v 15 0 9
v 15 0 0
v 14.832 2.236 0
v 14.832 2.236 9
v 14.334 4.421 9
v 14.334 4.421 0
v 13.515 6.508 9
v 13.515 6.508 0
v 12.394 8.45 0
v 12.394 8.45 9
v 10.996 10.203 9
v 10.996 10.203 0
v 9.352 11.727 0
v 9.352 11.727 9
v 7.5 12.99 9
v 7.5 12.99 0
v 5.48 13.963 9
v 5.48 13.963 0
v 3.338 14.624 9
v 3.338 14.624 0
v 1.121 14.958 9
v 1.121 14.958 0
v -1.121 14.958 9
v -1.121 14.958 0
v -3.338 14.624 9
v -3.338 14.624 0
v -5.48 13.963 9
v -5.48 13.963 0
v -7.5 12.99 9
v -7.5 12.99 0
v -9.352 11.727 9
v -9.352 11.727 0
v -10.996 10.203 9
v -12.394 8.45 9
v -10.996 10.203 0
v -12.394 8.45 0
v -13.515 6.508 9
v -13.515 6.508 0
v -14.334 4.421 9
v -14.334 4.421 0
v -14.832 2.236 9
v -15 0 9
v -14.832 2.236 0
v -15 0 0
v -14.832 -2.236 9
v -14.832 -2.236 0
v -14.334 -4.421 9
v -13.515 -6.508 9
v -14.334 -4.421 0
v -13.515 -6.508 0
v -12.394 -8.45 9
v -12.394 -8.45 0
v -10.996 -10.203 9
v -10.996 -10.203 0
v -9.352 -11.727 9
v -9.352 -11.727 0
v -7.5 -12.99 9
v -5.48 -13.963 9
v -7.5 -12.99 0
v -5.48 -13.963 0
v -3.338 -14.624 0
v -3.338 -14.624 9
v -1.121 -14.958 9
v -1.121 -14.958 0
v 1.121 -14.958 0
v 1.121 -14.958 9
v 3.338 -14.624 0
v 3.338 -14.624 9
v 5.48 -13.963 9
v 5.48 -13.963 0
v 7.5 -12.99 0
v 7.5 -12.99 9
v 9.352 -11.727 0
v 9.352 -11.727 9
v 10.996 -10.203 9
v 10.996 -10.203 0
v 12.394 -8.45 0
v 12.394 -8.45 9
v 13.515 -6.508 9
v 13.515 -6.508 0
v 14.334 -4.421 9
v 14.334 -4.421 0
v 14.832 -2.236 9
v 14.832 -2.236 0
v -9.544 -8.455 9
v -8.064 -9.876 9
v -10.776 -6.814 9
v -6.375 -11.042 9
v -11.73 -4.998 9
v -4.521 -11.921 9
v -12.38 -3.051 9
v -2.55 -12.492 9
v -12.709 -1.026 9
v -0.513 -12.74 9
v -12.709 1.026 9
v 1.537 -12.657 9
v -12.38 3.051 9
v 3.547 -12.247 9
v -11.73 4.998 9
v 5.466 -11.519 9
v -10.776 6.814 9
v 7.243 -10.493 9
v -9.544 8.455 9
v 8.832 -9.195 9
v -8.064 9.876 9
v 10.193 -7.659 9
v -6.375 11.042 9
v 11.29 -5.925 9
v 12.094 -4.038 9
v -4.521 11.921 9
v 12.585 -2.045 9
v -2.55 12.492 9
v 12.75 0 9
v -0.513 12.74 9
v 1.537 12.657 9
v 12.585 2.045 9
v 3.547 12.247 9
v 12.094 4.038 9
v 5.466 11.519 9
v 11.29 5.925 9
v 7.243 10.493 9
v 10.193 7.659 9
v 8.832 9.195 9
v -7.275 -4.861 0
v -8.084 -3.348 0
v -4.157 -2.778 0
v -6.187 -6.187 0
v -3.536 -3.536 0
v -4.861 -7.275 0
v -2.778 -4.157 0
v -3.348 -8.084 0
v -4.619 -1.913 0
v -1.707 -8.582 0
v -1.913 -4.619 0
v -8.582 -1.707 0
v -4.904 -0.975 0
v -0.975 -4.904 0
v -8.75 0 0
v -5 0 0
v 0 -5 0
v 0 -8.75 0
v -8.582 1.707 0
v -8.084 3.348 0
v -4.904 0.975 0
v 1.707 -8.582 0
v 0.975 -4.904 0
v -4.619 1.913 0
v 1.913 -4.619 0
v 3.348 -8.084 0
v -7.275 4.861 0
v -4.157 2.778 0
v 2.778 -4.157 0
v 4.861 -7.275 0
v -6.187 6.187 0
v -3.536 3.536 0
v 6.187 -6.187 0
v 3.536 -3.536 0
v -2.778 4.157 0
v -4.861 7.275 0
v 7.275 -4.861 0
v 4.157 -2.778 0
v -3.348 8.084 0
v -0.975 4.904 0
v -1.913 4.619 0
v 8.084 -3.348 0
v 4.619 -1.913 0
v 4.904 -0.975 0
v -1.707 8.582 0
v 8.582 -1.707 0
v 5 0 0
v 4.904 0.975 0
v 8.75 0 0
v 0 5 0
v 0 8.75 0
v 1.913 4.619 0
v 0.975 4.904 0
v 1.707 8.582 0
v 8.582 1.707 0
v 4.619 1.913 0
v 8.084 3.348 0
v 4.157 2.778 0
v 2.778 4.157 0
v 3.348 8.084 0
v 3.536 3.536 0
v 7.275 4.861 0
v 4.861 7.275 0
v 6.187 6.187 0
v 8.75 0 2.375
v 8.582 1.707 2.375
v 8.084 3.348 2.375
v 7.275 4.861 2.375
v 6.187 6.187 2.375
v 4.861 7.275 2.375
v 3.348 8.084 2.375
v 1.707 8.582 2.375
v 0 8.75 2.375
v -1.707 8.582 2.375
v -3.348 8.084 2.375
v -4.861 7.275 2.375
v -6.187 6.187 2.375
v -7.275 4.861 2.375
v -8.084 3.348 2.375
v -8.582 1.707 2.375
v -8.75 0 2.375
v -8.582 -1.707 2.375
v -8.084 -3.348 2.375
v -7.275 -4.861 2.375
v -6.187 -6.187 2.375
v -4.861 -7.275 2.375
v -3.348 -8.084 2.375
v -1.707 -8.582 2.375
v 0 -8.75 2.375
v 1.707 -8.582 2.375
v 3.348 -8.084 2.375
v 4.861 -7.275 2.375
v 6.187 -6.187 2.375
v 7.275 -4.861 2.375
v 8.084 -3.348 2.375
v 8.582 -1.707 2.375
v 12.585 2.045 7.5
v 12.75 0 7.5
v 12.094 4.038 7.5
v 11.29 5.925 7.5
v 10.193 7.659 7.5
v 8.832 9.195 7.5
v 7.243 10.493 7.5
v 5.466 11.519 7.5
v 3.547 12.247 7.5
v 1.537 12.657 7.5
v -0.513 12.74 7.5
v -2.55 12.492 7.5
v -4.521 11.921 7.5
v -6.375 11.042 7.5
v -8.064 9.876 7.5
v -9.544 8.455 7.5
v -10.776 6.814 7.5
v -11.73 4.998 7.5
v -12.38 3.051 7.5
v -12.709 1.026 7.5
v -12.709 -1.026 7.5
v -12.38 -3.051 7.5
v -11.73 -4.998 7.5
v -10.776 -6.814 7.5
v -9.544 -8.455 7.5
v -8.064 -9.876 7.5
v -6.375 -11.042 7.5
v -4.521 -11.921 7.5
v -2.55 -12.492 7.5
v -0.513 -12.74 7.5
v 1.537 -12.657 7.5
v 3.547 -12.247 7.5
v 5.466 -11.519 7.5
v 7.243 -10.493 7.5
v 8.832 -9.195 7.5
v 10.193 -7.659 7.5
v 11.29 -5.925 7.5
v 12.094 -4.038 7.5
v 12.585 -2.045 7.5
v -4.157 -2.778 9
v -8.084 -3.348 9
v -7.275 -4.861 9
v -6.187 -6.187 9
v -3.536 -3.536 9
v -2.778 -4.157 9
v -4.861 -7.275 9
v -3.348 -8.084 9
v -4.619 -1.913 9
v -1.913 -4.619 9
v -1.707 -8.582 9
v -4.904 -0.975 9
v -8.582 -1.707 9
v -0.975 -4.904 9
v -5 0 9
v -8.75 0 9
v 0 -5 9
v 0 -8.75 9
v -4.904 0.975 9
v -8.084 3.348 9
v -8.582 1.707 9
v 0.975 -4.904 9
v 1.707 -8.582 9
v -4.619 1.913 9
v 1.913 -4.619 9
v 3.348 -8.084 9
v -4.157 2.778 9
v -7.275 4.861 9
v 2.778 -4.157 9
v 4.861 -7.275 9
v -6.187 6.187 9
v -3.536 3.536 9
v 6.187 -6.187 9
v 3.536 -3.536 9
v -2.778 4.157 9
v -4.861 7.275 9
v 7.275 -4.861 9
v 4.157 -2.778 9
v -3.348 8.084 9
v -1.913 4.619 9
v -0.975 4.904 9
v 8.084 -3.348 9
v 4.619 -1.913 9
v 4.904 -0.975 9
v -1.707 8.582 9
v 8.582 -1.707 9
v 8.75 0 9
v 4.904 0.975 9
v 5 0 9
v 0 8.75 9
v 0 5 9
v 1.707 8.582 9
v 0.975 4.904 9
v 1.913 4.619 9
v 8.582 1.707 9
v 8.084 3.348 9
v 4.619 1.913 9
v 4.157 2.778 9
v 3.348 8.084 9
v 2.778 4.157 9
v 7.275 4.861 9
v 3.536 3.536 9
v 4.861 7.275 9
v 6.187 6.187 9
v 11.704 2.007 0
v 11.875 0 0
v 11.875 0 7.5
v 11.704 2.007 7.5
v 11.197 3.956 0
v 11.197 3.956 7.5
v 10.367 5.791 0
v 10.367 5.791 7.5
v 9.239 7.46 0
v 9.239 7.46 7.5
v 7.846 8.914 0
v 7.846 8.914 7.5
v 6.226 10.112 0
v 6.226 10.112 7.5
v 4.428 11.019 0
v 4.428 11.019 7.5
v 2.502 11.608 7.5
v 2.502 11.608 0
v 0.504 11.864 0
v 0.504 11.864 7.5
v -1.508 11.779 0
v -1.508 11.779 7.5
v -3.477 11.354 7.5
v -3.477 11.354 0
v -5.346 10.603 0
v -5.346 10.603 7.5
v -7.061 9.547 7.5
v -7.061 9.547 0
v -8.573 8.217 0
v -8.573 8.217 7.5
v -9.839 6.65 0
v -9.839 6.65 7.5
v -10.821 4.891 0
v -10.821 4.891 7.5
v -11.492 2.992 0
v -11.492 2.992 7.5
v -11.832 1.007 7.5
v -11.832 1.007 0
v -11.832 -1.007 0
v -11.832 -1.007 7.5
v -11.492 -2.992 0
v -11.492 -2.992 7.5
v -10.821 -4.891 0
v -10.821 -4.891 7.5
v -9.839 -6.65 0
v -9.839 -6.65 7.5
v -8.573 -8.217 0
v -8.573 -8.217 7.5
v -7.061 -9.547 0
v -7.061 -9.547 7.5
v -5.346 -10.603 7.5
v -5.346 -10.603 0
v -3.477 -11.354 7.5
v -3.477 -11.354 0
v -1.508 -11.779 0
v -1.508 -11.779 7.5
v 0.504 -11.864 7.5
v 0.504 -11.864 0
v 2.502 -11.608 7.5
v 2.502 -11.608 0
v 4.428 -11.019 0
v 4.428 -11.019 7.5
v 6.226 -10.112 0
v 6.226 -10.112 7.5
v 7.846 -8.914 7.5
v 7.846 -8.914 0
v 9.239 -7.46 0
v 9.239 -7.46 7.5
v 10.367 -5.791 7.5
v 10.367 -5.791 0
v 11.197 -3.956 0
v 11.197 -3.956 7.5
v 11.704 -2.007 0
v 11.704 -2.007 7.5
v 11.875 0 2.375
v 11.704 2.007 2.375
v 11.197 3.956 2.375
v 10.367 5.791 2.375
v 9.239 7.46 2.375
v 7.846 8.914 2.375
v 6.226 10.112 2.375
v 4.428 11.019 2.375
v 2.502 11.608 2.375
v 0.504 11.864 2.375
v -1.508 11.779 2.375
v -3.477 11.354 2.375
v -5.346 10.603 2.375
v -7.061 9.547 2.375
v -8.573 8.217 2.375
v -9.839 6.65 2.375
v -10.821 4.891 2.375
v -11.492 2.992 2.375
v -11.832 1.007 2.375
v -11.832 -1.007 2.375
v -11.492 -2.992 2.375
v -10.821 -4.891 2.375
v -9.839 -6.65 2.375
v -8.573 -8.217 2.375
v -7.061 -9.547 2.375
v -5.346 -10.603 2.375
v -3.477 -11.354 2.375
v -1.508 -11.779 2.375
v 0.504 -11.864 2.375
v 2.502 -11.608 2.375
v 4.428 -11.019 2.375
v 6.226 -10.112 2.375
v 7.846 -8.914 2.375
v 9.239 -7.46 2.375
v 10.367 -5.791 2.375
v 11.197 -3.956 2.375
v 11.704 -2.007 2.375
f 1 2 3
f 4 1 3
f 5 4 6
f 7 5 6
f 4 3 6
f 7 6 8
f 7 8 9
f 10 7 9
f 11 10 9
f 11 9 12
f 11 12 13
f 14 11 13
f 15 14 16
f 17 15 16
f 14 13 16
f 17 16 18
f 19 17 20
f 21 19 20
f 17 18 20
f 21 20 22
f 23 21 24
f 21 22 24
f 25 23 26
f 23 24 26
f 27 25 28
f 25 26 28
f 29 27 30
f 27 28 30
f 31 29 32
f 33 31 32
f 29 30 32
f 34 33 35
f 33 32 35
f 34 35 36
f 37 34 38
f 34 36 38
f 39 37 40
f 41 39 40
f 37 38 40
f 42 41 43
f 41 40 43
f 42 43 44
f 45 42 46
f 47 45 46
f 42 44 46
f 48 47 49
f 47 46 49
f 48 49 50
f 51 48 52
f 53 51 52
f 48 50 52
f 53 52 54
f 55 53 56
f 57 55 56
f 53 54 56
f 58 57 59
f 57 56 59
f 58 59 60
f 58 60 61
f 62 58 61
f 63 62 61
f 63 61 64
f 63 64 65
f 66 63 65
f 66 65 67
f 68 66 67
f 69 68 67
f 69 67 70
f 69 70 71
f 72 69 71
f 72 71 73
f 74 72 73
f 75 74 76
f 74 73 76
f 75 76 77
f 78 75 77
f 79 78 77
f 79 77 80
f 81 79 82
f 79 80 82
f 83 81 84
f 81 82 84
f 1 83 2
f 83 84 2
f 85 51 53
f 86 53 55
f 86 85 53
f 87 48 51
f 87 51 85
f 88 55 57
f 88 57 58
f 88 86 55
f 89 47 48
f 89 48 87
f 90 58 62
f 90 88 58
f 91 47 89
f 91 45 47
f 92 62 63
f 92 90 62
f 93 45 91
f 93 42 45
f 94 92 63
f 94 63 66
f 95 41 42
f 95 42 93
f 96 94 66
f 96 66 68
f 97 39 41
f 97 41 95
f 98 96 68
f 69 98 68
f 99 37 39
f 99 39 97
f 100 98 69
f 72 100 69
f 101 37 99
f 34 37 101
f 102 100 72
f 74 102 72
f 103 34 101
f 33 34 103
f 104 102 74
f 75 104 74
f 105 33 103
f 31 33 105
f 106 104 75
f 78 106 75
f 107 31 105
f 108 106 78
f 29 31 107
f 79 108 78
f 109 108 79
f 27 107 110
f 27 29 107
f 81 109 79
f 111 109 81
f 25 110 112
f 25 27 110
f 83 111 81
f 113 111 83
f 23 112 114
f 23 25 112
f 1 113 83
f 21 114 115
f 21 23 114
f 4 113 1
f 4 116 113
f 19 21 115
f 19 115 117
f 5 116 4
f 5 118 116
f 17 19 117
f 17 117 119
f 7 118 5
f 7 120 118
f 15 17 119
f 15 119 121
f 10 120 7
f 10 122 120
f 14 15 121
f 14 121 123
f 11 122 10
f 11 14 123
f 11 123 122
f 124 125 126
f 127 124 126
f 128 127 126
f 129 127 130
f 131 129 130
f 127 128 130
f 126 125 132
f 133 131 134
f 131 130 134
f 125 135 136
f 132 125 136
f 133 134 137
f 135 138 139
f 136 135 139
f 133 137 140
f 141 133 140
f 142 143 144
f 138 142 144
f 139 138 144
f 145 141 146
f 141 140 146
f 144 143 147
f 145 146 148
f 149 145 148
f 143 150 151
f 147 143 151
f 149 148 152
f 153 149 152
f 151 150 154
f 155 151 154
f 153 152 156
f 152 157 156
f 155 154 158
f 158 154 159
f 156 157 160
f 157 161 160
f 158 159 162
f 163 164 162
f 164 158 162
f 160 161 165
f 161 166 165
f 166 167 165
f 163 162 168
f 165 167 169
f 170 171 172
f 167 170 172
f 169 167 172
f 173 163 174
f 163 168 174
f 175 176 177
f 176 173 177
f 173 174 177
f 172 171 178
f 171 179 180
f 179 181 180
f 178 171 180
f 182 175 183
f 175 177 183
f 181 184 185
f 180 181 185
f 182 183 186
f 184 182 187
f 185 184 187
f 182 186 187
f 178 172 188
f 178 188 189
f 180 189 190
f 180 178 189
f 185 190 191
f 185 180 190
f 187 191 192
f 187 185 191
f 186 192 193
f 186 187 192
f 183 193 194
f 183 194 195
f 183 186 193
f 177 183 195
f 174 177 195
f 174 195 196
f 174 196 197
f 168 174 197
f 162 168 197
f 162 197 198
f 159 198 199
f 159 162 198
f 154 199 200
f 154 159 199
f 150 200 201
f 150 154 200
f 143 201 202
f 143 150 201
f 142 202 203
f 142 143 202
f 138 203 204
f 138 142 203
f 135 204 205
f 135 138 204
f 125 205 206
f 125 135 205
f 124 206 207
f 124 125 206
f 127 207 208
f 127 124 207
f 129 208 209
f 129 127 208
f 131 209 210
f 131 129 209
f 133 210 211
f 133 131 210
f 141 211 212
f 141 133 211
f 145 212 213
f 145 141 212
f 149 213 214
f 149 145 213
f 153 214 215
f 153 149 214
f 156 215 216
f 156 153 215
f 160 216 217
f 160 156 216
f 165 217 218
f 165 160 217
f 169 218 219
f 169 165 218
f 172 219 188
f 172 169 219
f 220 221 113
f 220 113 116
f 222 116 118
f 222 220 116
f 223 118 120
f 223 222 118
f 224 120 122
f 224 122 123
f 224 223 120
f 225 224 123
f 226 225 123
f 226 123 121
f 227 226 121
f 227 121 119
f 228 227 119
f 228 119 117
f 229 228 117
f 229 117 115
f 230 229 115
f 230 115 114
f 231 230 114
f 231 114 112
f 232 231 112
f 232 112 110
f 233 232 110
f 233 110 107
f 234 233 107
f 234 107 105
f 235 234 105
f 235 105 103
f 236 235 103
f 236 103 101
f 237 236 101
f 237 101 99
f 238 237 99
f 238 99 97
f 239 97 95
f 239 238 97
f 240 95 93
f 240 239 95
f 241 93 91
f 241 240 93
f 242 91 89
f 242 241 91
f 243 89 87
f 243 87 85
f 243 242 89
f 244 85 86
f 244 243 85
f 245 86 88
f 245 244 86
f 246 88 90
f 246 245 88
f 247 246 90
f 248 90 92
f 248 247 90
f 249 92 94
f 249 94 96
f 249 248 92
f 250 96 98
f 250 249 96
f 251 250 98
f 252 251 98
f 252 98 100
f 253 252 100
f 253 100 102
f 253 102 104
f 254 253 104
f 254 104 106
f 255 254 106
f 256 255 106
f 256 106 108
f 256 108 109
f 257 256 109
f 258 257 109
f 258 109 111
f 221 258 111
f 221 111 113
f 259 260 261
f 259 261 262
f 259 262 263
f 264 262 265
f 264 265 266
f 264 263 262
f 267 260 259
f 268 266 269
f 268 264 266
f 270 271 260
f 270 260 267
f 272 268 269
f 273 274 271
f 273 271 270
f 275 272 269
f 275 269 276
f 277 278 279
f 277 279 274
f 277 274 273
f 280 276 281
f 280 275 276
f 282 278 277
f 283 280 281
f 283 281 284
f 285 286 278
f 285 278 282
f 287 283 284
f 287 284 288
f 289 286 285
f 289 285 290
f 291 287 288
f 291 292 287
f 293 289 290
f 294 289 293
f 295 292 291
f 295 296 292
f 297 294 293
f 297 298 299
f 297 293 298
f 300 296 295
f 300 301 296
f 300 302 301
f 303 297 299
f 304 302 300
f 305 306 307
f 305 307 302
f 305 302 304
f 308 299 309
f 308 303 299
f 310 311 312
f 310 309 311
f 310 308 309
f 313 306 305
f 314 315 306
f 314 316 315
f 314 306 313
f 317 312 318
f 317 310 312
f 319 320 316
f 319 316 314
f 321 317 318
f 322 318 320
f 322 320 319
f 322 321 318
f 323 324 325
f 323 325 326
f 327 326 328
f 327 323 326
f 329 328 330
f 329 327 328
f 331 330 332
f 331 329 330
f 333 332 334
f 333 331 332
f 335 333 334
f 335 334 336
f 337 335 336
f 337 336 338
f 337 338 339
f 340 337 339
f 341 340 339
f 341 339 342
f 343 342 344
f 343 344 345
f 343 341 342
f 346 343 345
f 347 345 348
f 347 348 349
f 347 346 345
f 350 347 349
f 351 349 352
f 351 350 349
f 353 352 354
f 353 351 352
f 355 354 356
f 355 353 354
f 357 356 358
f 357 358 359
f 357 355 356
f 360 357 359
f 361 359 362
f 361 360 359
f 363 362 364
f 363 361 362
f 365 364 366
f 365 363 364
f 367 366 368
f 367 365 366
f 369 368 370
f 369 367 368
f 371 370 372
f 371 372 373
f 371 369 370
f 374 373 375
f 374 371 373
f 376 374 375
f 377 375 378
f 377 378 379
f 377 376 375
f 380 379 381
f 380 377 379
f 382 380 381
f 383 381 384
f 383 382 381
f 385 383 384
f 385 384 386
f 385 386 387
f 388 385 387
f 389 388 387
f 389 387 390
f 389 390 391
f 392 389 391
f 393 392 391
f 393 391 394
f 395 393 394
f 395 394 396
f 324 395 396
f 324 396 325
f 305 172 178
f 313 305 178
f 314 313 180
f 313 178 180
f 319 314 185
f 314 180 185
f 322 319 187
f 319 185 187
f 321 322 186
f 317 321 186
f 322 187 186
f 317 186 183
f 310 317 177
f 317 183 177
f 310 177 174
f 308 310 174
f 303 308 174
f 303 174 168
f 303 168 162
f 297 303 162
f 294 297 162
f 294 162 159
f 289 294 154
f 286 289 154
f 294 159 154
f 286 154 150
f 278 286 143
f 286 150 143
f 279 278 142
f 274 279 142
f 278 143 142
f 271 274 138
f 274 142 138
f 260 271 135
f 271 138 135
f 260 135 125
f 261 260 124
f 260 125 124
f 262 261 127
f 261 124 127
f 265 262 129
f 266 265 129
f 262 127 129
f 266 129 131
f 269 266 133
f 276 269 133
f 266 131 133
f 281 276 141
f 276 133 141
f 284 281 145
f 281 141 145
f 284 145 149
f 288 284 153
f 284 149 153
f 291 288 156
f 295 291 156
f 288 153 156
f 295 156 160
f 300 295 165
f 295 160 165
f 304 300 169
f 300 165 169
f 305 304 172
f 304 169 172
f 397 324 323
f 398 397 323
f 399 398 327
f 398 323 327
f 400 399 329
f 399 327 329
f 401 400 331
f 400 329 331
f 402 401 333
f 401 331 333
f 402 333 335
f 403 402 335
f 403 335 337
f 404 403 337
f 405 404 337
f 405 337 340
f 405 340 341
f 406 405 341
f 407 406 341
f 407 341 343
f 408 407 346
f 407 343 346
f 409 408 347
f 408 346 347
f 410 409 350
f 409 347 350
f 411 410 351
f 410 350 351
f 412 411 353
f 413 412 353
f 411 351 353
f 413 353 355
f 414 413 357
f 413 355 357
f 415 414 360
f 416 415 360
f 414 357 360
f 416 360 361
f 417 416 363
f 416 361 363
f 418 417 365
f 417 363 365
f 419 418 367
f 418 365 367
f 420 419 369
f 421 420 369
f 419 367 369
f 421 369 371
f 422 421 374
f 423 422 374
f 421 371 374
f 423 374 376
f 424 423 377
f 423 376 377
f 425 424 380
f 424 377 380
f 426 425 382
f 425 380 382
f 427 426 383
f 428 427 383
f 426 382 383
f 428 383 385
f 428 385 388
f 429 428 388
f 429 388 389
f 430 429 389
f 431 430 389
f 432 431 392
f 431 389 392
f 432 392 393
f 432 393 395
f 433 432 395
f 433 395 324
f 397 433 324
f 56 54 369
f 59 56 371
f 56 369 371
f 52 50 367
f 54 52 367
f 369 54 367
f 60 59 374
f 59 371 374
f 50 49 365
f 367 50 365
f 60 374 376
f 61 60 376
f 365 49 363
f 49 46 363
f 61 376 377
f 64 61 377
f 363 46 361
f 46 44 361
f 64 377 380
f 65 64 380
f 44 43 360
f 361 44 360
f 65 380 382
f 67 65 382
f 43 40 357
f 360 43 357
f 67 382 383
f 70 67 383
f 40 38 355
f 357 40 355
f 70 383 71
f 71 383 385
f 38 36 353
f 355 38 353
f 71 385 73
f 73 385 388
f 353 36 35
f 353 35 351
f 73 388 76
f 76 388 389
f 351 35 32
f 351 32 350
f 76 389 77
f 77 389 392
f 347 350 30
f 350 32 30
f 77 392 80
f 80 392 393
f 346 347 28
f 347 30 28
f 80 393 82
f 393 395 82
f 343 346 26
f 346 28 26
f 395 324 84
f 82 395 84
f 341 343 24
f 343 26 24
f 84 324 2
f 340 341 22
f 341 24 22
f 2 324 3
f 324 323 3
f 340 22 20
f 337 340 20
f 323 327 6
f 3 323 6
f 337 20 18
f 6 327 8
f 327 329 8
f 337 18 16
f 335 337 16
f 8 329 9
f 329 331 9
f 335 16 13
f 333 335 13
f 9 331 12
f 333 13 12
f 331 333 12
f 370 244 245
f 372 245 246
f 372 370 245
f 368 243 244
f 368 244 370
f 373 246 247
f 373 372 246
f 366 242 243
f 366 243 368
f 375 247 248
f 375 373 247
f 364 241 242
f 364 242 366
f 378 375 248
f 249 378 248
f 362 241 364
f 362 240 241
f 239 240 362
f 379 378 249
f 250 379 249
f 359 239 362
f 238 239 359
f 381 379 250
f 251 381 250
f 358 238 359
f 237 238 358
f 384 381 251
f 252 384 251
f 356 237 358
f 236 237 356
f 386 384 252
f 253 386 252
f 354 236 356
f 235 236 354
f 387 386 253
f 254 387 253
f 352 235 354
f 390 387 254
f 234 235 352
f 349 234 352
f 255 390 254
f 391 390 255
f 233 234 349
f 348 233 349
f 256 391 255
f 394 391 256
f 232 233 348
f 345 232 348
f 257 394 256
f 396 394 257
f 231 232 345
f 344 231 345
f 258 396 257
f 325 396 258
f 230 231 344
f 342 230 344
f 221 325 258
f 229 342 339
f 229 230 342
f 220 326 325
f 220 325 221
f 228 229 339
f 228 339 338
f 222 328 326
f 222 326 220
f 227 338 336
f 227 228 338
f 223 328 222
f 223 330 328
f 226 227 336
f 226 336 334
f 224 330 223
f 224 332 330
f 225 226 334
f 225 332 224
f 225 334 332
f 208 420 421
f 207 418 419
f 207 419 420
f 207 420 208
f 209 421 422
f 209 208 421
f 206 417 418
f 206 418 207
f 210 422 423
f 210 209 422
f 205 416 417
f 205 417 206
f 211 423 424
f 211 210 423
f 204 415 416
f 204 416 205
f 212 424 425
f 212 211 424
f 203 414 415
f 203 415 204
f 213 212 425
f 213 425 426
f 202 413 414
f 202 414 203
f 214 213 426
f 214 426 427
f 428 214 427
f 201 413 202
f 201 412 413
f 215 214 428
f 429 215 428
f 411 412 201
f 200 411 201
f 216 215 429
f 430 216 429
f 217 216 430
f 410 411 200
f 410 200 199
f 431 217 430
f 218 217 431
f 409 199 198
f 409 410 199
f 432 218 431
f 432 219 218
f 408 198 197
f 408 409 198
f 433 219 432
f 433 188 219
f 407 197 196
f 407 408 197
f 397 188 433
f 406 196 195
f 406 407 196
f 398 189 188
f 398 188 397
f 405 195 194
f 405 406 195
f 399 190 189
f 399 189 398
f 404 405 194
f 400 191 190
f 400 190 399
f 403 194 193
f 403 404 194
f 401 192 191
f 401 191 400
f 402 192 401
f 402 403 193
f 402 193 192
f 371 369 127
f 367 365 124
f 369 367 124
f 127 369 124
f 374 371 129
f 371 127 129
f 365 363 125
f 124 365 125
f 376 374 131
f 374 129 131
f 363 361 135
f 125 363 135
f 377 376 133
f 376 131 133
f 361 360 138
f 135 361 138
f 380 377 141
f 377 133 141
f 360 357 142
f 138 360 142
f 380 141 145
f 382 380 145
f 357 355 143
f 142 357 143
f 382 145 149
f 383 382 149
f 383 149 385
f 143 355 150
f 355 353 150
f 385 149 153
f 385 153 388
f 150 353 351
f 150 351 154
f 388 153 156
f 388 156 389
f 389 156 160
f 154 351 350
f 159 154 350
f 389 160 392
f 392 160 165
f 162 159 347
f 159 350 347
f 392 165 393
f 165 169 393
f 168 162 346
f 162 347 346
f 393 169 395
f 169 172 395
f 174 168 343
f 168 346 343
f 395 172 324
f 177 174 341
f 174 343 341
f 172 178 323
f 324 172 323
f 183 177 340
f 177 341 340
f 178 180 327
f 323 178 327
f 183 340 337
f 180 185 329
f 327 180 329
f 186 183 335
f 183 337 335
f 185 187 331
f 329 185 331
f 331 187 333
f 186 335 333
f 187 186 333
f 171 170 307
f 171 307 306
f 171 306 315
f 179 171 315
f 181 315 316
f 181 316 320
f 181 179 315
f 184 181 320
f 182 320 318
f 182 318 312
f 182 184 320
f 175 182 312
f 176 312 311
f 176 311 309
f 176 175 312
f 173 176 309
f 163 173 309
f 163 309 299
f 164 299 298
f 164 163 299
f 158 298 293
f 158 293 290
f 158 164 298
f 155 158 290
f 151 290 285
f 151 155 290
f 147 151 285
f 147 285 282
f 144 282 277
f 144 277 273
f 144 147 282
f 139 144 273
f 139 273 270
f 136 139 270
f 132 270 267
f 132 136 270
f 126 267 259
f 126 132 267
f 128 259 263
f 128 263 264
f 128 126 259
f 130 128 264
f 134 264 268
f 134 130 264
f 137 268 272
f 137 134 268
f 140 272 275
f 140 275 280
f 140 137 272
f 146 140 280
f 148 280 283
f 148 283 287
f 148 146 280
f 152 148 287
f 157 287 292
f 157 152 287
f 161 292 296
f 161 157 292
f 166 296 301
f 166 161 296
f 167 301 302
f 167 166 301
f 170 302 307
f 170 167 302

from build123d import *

# Parameters (mm, degrees)
F0_R     = 15
F0_R_2   = 12.75
F0_R_3   = 8.75
F0_R_4   = 5
F1_DEPTH = 9
F0_R_5   = 11.875
F2_DEPTH = 7.5
F3_DEPTH = 2.375


with BuildPart() as f1:
    # F0 (on Top) → F1 (new body)
    with BuildSketch(Plane.XY):
        Circle(F0_R)
        Circle(F0_R_2, mode=Mode.SUBTRACT)
        Circle(F0_R_3)
        Circle(F0_R_4, mode=Mode.SUBTRACT)
    extrude(amount=F1_DEPTH)

    # F0 (on Top) → F2 (join)
    with BuildSketch(Plane.XY):
        Circle(F0_R_2)
        Circle(F0_R_5, mode=Mode.SUBTRACT)
    extrude(amount=F2_DEPTH)


with BuildPart() as f3:
    # F0 (on Top) → F3 (new body)
    with BuildSketch(Plane.XY):
        Circle(F0_R_5)
        Circle(F0_R_3, mode=Mode.SUBTRACT)
    extrude(amount=F3_DEPTH)


solid = Compound([f1.part, f3.part])
